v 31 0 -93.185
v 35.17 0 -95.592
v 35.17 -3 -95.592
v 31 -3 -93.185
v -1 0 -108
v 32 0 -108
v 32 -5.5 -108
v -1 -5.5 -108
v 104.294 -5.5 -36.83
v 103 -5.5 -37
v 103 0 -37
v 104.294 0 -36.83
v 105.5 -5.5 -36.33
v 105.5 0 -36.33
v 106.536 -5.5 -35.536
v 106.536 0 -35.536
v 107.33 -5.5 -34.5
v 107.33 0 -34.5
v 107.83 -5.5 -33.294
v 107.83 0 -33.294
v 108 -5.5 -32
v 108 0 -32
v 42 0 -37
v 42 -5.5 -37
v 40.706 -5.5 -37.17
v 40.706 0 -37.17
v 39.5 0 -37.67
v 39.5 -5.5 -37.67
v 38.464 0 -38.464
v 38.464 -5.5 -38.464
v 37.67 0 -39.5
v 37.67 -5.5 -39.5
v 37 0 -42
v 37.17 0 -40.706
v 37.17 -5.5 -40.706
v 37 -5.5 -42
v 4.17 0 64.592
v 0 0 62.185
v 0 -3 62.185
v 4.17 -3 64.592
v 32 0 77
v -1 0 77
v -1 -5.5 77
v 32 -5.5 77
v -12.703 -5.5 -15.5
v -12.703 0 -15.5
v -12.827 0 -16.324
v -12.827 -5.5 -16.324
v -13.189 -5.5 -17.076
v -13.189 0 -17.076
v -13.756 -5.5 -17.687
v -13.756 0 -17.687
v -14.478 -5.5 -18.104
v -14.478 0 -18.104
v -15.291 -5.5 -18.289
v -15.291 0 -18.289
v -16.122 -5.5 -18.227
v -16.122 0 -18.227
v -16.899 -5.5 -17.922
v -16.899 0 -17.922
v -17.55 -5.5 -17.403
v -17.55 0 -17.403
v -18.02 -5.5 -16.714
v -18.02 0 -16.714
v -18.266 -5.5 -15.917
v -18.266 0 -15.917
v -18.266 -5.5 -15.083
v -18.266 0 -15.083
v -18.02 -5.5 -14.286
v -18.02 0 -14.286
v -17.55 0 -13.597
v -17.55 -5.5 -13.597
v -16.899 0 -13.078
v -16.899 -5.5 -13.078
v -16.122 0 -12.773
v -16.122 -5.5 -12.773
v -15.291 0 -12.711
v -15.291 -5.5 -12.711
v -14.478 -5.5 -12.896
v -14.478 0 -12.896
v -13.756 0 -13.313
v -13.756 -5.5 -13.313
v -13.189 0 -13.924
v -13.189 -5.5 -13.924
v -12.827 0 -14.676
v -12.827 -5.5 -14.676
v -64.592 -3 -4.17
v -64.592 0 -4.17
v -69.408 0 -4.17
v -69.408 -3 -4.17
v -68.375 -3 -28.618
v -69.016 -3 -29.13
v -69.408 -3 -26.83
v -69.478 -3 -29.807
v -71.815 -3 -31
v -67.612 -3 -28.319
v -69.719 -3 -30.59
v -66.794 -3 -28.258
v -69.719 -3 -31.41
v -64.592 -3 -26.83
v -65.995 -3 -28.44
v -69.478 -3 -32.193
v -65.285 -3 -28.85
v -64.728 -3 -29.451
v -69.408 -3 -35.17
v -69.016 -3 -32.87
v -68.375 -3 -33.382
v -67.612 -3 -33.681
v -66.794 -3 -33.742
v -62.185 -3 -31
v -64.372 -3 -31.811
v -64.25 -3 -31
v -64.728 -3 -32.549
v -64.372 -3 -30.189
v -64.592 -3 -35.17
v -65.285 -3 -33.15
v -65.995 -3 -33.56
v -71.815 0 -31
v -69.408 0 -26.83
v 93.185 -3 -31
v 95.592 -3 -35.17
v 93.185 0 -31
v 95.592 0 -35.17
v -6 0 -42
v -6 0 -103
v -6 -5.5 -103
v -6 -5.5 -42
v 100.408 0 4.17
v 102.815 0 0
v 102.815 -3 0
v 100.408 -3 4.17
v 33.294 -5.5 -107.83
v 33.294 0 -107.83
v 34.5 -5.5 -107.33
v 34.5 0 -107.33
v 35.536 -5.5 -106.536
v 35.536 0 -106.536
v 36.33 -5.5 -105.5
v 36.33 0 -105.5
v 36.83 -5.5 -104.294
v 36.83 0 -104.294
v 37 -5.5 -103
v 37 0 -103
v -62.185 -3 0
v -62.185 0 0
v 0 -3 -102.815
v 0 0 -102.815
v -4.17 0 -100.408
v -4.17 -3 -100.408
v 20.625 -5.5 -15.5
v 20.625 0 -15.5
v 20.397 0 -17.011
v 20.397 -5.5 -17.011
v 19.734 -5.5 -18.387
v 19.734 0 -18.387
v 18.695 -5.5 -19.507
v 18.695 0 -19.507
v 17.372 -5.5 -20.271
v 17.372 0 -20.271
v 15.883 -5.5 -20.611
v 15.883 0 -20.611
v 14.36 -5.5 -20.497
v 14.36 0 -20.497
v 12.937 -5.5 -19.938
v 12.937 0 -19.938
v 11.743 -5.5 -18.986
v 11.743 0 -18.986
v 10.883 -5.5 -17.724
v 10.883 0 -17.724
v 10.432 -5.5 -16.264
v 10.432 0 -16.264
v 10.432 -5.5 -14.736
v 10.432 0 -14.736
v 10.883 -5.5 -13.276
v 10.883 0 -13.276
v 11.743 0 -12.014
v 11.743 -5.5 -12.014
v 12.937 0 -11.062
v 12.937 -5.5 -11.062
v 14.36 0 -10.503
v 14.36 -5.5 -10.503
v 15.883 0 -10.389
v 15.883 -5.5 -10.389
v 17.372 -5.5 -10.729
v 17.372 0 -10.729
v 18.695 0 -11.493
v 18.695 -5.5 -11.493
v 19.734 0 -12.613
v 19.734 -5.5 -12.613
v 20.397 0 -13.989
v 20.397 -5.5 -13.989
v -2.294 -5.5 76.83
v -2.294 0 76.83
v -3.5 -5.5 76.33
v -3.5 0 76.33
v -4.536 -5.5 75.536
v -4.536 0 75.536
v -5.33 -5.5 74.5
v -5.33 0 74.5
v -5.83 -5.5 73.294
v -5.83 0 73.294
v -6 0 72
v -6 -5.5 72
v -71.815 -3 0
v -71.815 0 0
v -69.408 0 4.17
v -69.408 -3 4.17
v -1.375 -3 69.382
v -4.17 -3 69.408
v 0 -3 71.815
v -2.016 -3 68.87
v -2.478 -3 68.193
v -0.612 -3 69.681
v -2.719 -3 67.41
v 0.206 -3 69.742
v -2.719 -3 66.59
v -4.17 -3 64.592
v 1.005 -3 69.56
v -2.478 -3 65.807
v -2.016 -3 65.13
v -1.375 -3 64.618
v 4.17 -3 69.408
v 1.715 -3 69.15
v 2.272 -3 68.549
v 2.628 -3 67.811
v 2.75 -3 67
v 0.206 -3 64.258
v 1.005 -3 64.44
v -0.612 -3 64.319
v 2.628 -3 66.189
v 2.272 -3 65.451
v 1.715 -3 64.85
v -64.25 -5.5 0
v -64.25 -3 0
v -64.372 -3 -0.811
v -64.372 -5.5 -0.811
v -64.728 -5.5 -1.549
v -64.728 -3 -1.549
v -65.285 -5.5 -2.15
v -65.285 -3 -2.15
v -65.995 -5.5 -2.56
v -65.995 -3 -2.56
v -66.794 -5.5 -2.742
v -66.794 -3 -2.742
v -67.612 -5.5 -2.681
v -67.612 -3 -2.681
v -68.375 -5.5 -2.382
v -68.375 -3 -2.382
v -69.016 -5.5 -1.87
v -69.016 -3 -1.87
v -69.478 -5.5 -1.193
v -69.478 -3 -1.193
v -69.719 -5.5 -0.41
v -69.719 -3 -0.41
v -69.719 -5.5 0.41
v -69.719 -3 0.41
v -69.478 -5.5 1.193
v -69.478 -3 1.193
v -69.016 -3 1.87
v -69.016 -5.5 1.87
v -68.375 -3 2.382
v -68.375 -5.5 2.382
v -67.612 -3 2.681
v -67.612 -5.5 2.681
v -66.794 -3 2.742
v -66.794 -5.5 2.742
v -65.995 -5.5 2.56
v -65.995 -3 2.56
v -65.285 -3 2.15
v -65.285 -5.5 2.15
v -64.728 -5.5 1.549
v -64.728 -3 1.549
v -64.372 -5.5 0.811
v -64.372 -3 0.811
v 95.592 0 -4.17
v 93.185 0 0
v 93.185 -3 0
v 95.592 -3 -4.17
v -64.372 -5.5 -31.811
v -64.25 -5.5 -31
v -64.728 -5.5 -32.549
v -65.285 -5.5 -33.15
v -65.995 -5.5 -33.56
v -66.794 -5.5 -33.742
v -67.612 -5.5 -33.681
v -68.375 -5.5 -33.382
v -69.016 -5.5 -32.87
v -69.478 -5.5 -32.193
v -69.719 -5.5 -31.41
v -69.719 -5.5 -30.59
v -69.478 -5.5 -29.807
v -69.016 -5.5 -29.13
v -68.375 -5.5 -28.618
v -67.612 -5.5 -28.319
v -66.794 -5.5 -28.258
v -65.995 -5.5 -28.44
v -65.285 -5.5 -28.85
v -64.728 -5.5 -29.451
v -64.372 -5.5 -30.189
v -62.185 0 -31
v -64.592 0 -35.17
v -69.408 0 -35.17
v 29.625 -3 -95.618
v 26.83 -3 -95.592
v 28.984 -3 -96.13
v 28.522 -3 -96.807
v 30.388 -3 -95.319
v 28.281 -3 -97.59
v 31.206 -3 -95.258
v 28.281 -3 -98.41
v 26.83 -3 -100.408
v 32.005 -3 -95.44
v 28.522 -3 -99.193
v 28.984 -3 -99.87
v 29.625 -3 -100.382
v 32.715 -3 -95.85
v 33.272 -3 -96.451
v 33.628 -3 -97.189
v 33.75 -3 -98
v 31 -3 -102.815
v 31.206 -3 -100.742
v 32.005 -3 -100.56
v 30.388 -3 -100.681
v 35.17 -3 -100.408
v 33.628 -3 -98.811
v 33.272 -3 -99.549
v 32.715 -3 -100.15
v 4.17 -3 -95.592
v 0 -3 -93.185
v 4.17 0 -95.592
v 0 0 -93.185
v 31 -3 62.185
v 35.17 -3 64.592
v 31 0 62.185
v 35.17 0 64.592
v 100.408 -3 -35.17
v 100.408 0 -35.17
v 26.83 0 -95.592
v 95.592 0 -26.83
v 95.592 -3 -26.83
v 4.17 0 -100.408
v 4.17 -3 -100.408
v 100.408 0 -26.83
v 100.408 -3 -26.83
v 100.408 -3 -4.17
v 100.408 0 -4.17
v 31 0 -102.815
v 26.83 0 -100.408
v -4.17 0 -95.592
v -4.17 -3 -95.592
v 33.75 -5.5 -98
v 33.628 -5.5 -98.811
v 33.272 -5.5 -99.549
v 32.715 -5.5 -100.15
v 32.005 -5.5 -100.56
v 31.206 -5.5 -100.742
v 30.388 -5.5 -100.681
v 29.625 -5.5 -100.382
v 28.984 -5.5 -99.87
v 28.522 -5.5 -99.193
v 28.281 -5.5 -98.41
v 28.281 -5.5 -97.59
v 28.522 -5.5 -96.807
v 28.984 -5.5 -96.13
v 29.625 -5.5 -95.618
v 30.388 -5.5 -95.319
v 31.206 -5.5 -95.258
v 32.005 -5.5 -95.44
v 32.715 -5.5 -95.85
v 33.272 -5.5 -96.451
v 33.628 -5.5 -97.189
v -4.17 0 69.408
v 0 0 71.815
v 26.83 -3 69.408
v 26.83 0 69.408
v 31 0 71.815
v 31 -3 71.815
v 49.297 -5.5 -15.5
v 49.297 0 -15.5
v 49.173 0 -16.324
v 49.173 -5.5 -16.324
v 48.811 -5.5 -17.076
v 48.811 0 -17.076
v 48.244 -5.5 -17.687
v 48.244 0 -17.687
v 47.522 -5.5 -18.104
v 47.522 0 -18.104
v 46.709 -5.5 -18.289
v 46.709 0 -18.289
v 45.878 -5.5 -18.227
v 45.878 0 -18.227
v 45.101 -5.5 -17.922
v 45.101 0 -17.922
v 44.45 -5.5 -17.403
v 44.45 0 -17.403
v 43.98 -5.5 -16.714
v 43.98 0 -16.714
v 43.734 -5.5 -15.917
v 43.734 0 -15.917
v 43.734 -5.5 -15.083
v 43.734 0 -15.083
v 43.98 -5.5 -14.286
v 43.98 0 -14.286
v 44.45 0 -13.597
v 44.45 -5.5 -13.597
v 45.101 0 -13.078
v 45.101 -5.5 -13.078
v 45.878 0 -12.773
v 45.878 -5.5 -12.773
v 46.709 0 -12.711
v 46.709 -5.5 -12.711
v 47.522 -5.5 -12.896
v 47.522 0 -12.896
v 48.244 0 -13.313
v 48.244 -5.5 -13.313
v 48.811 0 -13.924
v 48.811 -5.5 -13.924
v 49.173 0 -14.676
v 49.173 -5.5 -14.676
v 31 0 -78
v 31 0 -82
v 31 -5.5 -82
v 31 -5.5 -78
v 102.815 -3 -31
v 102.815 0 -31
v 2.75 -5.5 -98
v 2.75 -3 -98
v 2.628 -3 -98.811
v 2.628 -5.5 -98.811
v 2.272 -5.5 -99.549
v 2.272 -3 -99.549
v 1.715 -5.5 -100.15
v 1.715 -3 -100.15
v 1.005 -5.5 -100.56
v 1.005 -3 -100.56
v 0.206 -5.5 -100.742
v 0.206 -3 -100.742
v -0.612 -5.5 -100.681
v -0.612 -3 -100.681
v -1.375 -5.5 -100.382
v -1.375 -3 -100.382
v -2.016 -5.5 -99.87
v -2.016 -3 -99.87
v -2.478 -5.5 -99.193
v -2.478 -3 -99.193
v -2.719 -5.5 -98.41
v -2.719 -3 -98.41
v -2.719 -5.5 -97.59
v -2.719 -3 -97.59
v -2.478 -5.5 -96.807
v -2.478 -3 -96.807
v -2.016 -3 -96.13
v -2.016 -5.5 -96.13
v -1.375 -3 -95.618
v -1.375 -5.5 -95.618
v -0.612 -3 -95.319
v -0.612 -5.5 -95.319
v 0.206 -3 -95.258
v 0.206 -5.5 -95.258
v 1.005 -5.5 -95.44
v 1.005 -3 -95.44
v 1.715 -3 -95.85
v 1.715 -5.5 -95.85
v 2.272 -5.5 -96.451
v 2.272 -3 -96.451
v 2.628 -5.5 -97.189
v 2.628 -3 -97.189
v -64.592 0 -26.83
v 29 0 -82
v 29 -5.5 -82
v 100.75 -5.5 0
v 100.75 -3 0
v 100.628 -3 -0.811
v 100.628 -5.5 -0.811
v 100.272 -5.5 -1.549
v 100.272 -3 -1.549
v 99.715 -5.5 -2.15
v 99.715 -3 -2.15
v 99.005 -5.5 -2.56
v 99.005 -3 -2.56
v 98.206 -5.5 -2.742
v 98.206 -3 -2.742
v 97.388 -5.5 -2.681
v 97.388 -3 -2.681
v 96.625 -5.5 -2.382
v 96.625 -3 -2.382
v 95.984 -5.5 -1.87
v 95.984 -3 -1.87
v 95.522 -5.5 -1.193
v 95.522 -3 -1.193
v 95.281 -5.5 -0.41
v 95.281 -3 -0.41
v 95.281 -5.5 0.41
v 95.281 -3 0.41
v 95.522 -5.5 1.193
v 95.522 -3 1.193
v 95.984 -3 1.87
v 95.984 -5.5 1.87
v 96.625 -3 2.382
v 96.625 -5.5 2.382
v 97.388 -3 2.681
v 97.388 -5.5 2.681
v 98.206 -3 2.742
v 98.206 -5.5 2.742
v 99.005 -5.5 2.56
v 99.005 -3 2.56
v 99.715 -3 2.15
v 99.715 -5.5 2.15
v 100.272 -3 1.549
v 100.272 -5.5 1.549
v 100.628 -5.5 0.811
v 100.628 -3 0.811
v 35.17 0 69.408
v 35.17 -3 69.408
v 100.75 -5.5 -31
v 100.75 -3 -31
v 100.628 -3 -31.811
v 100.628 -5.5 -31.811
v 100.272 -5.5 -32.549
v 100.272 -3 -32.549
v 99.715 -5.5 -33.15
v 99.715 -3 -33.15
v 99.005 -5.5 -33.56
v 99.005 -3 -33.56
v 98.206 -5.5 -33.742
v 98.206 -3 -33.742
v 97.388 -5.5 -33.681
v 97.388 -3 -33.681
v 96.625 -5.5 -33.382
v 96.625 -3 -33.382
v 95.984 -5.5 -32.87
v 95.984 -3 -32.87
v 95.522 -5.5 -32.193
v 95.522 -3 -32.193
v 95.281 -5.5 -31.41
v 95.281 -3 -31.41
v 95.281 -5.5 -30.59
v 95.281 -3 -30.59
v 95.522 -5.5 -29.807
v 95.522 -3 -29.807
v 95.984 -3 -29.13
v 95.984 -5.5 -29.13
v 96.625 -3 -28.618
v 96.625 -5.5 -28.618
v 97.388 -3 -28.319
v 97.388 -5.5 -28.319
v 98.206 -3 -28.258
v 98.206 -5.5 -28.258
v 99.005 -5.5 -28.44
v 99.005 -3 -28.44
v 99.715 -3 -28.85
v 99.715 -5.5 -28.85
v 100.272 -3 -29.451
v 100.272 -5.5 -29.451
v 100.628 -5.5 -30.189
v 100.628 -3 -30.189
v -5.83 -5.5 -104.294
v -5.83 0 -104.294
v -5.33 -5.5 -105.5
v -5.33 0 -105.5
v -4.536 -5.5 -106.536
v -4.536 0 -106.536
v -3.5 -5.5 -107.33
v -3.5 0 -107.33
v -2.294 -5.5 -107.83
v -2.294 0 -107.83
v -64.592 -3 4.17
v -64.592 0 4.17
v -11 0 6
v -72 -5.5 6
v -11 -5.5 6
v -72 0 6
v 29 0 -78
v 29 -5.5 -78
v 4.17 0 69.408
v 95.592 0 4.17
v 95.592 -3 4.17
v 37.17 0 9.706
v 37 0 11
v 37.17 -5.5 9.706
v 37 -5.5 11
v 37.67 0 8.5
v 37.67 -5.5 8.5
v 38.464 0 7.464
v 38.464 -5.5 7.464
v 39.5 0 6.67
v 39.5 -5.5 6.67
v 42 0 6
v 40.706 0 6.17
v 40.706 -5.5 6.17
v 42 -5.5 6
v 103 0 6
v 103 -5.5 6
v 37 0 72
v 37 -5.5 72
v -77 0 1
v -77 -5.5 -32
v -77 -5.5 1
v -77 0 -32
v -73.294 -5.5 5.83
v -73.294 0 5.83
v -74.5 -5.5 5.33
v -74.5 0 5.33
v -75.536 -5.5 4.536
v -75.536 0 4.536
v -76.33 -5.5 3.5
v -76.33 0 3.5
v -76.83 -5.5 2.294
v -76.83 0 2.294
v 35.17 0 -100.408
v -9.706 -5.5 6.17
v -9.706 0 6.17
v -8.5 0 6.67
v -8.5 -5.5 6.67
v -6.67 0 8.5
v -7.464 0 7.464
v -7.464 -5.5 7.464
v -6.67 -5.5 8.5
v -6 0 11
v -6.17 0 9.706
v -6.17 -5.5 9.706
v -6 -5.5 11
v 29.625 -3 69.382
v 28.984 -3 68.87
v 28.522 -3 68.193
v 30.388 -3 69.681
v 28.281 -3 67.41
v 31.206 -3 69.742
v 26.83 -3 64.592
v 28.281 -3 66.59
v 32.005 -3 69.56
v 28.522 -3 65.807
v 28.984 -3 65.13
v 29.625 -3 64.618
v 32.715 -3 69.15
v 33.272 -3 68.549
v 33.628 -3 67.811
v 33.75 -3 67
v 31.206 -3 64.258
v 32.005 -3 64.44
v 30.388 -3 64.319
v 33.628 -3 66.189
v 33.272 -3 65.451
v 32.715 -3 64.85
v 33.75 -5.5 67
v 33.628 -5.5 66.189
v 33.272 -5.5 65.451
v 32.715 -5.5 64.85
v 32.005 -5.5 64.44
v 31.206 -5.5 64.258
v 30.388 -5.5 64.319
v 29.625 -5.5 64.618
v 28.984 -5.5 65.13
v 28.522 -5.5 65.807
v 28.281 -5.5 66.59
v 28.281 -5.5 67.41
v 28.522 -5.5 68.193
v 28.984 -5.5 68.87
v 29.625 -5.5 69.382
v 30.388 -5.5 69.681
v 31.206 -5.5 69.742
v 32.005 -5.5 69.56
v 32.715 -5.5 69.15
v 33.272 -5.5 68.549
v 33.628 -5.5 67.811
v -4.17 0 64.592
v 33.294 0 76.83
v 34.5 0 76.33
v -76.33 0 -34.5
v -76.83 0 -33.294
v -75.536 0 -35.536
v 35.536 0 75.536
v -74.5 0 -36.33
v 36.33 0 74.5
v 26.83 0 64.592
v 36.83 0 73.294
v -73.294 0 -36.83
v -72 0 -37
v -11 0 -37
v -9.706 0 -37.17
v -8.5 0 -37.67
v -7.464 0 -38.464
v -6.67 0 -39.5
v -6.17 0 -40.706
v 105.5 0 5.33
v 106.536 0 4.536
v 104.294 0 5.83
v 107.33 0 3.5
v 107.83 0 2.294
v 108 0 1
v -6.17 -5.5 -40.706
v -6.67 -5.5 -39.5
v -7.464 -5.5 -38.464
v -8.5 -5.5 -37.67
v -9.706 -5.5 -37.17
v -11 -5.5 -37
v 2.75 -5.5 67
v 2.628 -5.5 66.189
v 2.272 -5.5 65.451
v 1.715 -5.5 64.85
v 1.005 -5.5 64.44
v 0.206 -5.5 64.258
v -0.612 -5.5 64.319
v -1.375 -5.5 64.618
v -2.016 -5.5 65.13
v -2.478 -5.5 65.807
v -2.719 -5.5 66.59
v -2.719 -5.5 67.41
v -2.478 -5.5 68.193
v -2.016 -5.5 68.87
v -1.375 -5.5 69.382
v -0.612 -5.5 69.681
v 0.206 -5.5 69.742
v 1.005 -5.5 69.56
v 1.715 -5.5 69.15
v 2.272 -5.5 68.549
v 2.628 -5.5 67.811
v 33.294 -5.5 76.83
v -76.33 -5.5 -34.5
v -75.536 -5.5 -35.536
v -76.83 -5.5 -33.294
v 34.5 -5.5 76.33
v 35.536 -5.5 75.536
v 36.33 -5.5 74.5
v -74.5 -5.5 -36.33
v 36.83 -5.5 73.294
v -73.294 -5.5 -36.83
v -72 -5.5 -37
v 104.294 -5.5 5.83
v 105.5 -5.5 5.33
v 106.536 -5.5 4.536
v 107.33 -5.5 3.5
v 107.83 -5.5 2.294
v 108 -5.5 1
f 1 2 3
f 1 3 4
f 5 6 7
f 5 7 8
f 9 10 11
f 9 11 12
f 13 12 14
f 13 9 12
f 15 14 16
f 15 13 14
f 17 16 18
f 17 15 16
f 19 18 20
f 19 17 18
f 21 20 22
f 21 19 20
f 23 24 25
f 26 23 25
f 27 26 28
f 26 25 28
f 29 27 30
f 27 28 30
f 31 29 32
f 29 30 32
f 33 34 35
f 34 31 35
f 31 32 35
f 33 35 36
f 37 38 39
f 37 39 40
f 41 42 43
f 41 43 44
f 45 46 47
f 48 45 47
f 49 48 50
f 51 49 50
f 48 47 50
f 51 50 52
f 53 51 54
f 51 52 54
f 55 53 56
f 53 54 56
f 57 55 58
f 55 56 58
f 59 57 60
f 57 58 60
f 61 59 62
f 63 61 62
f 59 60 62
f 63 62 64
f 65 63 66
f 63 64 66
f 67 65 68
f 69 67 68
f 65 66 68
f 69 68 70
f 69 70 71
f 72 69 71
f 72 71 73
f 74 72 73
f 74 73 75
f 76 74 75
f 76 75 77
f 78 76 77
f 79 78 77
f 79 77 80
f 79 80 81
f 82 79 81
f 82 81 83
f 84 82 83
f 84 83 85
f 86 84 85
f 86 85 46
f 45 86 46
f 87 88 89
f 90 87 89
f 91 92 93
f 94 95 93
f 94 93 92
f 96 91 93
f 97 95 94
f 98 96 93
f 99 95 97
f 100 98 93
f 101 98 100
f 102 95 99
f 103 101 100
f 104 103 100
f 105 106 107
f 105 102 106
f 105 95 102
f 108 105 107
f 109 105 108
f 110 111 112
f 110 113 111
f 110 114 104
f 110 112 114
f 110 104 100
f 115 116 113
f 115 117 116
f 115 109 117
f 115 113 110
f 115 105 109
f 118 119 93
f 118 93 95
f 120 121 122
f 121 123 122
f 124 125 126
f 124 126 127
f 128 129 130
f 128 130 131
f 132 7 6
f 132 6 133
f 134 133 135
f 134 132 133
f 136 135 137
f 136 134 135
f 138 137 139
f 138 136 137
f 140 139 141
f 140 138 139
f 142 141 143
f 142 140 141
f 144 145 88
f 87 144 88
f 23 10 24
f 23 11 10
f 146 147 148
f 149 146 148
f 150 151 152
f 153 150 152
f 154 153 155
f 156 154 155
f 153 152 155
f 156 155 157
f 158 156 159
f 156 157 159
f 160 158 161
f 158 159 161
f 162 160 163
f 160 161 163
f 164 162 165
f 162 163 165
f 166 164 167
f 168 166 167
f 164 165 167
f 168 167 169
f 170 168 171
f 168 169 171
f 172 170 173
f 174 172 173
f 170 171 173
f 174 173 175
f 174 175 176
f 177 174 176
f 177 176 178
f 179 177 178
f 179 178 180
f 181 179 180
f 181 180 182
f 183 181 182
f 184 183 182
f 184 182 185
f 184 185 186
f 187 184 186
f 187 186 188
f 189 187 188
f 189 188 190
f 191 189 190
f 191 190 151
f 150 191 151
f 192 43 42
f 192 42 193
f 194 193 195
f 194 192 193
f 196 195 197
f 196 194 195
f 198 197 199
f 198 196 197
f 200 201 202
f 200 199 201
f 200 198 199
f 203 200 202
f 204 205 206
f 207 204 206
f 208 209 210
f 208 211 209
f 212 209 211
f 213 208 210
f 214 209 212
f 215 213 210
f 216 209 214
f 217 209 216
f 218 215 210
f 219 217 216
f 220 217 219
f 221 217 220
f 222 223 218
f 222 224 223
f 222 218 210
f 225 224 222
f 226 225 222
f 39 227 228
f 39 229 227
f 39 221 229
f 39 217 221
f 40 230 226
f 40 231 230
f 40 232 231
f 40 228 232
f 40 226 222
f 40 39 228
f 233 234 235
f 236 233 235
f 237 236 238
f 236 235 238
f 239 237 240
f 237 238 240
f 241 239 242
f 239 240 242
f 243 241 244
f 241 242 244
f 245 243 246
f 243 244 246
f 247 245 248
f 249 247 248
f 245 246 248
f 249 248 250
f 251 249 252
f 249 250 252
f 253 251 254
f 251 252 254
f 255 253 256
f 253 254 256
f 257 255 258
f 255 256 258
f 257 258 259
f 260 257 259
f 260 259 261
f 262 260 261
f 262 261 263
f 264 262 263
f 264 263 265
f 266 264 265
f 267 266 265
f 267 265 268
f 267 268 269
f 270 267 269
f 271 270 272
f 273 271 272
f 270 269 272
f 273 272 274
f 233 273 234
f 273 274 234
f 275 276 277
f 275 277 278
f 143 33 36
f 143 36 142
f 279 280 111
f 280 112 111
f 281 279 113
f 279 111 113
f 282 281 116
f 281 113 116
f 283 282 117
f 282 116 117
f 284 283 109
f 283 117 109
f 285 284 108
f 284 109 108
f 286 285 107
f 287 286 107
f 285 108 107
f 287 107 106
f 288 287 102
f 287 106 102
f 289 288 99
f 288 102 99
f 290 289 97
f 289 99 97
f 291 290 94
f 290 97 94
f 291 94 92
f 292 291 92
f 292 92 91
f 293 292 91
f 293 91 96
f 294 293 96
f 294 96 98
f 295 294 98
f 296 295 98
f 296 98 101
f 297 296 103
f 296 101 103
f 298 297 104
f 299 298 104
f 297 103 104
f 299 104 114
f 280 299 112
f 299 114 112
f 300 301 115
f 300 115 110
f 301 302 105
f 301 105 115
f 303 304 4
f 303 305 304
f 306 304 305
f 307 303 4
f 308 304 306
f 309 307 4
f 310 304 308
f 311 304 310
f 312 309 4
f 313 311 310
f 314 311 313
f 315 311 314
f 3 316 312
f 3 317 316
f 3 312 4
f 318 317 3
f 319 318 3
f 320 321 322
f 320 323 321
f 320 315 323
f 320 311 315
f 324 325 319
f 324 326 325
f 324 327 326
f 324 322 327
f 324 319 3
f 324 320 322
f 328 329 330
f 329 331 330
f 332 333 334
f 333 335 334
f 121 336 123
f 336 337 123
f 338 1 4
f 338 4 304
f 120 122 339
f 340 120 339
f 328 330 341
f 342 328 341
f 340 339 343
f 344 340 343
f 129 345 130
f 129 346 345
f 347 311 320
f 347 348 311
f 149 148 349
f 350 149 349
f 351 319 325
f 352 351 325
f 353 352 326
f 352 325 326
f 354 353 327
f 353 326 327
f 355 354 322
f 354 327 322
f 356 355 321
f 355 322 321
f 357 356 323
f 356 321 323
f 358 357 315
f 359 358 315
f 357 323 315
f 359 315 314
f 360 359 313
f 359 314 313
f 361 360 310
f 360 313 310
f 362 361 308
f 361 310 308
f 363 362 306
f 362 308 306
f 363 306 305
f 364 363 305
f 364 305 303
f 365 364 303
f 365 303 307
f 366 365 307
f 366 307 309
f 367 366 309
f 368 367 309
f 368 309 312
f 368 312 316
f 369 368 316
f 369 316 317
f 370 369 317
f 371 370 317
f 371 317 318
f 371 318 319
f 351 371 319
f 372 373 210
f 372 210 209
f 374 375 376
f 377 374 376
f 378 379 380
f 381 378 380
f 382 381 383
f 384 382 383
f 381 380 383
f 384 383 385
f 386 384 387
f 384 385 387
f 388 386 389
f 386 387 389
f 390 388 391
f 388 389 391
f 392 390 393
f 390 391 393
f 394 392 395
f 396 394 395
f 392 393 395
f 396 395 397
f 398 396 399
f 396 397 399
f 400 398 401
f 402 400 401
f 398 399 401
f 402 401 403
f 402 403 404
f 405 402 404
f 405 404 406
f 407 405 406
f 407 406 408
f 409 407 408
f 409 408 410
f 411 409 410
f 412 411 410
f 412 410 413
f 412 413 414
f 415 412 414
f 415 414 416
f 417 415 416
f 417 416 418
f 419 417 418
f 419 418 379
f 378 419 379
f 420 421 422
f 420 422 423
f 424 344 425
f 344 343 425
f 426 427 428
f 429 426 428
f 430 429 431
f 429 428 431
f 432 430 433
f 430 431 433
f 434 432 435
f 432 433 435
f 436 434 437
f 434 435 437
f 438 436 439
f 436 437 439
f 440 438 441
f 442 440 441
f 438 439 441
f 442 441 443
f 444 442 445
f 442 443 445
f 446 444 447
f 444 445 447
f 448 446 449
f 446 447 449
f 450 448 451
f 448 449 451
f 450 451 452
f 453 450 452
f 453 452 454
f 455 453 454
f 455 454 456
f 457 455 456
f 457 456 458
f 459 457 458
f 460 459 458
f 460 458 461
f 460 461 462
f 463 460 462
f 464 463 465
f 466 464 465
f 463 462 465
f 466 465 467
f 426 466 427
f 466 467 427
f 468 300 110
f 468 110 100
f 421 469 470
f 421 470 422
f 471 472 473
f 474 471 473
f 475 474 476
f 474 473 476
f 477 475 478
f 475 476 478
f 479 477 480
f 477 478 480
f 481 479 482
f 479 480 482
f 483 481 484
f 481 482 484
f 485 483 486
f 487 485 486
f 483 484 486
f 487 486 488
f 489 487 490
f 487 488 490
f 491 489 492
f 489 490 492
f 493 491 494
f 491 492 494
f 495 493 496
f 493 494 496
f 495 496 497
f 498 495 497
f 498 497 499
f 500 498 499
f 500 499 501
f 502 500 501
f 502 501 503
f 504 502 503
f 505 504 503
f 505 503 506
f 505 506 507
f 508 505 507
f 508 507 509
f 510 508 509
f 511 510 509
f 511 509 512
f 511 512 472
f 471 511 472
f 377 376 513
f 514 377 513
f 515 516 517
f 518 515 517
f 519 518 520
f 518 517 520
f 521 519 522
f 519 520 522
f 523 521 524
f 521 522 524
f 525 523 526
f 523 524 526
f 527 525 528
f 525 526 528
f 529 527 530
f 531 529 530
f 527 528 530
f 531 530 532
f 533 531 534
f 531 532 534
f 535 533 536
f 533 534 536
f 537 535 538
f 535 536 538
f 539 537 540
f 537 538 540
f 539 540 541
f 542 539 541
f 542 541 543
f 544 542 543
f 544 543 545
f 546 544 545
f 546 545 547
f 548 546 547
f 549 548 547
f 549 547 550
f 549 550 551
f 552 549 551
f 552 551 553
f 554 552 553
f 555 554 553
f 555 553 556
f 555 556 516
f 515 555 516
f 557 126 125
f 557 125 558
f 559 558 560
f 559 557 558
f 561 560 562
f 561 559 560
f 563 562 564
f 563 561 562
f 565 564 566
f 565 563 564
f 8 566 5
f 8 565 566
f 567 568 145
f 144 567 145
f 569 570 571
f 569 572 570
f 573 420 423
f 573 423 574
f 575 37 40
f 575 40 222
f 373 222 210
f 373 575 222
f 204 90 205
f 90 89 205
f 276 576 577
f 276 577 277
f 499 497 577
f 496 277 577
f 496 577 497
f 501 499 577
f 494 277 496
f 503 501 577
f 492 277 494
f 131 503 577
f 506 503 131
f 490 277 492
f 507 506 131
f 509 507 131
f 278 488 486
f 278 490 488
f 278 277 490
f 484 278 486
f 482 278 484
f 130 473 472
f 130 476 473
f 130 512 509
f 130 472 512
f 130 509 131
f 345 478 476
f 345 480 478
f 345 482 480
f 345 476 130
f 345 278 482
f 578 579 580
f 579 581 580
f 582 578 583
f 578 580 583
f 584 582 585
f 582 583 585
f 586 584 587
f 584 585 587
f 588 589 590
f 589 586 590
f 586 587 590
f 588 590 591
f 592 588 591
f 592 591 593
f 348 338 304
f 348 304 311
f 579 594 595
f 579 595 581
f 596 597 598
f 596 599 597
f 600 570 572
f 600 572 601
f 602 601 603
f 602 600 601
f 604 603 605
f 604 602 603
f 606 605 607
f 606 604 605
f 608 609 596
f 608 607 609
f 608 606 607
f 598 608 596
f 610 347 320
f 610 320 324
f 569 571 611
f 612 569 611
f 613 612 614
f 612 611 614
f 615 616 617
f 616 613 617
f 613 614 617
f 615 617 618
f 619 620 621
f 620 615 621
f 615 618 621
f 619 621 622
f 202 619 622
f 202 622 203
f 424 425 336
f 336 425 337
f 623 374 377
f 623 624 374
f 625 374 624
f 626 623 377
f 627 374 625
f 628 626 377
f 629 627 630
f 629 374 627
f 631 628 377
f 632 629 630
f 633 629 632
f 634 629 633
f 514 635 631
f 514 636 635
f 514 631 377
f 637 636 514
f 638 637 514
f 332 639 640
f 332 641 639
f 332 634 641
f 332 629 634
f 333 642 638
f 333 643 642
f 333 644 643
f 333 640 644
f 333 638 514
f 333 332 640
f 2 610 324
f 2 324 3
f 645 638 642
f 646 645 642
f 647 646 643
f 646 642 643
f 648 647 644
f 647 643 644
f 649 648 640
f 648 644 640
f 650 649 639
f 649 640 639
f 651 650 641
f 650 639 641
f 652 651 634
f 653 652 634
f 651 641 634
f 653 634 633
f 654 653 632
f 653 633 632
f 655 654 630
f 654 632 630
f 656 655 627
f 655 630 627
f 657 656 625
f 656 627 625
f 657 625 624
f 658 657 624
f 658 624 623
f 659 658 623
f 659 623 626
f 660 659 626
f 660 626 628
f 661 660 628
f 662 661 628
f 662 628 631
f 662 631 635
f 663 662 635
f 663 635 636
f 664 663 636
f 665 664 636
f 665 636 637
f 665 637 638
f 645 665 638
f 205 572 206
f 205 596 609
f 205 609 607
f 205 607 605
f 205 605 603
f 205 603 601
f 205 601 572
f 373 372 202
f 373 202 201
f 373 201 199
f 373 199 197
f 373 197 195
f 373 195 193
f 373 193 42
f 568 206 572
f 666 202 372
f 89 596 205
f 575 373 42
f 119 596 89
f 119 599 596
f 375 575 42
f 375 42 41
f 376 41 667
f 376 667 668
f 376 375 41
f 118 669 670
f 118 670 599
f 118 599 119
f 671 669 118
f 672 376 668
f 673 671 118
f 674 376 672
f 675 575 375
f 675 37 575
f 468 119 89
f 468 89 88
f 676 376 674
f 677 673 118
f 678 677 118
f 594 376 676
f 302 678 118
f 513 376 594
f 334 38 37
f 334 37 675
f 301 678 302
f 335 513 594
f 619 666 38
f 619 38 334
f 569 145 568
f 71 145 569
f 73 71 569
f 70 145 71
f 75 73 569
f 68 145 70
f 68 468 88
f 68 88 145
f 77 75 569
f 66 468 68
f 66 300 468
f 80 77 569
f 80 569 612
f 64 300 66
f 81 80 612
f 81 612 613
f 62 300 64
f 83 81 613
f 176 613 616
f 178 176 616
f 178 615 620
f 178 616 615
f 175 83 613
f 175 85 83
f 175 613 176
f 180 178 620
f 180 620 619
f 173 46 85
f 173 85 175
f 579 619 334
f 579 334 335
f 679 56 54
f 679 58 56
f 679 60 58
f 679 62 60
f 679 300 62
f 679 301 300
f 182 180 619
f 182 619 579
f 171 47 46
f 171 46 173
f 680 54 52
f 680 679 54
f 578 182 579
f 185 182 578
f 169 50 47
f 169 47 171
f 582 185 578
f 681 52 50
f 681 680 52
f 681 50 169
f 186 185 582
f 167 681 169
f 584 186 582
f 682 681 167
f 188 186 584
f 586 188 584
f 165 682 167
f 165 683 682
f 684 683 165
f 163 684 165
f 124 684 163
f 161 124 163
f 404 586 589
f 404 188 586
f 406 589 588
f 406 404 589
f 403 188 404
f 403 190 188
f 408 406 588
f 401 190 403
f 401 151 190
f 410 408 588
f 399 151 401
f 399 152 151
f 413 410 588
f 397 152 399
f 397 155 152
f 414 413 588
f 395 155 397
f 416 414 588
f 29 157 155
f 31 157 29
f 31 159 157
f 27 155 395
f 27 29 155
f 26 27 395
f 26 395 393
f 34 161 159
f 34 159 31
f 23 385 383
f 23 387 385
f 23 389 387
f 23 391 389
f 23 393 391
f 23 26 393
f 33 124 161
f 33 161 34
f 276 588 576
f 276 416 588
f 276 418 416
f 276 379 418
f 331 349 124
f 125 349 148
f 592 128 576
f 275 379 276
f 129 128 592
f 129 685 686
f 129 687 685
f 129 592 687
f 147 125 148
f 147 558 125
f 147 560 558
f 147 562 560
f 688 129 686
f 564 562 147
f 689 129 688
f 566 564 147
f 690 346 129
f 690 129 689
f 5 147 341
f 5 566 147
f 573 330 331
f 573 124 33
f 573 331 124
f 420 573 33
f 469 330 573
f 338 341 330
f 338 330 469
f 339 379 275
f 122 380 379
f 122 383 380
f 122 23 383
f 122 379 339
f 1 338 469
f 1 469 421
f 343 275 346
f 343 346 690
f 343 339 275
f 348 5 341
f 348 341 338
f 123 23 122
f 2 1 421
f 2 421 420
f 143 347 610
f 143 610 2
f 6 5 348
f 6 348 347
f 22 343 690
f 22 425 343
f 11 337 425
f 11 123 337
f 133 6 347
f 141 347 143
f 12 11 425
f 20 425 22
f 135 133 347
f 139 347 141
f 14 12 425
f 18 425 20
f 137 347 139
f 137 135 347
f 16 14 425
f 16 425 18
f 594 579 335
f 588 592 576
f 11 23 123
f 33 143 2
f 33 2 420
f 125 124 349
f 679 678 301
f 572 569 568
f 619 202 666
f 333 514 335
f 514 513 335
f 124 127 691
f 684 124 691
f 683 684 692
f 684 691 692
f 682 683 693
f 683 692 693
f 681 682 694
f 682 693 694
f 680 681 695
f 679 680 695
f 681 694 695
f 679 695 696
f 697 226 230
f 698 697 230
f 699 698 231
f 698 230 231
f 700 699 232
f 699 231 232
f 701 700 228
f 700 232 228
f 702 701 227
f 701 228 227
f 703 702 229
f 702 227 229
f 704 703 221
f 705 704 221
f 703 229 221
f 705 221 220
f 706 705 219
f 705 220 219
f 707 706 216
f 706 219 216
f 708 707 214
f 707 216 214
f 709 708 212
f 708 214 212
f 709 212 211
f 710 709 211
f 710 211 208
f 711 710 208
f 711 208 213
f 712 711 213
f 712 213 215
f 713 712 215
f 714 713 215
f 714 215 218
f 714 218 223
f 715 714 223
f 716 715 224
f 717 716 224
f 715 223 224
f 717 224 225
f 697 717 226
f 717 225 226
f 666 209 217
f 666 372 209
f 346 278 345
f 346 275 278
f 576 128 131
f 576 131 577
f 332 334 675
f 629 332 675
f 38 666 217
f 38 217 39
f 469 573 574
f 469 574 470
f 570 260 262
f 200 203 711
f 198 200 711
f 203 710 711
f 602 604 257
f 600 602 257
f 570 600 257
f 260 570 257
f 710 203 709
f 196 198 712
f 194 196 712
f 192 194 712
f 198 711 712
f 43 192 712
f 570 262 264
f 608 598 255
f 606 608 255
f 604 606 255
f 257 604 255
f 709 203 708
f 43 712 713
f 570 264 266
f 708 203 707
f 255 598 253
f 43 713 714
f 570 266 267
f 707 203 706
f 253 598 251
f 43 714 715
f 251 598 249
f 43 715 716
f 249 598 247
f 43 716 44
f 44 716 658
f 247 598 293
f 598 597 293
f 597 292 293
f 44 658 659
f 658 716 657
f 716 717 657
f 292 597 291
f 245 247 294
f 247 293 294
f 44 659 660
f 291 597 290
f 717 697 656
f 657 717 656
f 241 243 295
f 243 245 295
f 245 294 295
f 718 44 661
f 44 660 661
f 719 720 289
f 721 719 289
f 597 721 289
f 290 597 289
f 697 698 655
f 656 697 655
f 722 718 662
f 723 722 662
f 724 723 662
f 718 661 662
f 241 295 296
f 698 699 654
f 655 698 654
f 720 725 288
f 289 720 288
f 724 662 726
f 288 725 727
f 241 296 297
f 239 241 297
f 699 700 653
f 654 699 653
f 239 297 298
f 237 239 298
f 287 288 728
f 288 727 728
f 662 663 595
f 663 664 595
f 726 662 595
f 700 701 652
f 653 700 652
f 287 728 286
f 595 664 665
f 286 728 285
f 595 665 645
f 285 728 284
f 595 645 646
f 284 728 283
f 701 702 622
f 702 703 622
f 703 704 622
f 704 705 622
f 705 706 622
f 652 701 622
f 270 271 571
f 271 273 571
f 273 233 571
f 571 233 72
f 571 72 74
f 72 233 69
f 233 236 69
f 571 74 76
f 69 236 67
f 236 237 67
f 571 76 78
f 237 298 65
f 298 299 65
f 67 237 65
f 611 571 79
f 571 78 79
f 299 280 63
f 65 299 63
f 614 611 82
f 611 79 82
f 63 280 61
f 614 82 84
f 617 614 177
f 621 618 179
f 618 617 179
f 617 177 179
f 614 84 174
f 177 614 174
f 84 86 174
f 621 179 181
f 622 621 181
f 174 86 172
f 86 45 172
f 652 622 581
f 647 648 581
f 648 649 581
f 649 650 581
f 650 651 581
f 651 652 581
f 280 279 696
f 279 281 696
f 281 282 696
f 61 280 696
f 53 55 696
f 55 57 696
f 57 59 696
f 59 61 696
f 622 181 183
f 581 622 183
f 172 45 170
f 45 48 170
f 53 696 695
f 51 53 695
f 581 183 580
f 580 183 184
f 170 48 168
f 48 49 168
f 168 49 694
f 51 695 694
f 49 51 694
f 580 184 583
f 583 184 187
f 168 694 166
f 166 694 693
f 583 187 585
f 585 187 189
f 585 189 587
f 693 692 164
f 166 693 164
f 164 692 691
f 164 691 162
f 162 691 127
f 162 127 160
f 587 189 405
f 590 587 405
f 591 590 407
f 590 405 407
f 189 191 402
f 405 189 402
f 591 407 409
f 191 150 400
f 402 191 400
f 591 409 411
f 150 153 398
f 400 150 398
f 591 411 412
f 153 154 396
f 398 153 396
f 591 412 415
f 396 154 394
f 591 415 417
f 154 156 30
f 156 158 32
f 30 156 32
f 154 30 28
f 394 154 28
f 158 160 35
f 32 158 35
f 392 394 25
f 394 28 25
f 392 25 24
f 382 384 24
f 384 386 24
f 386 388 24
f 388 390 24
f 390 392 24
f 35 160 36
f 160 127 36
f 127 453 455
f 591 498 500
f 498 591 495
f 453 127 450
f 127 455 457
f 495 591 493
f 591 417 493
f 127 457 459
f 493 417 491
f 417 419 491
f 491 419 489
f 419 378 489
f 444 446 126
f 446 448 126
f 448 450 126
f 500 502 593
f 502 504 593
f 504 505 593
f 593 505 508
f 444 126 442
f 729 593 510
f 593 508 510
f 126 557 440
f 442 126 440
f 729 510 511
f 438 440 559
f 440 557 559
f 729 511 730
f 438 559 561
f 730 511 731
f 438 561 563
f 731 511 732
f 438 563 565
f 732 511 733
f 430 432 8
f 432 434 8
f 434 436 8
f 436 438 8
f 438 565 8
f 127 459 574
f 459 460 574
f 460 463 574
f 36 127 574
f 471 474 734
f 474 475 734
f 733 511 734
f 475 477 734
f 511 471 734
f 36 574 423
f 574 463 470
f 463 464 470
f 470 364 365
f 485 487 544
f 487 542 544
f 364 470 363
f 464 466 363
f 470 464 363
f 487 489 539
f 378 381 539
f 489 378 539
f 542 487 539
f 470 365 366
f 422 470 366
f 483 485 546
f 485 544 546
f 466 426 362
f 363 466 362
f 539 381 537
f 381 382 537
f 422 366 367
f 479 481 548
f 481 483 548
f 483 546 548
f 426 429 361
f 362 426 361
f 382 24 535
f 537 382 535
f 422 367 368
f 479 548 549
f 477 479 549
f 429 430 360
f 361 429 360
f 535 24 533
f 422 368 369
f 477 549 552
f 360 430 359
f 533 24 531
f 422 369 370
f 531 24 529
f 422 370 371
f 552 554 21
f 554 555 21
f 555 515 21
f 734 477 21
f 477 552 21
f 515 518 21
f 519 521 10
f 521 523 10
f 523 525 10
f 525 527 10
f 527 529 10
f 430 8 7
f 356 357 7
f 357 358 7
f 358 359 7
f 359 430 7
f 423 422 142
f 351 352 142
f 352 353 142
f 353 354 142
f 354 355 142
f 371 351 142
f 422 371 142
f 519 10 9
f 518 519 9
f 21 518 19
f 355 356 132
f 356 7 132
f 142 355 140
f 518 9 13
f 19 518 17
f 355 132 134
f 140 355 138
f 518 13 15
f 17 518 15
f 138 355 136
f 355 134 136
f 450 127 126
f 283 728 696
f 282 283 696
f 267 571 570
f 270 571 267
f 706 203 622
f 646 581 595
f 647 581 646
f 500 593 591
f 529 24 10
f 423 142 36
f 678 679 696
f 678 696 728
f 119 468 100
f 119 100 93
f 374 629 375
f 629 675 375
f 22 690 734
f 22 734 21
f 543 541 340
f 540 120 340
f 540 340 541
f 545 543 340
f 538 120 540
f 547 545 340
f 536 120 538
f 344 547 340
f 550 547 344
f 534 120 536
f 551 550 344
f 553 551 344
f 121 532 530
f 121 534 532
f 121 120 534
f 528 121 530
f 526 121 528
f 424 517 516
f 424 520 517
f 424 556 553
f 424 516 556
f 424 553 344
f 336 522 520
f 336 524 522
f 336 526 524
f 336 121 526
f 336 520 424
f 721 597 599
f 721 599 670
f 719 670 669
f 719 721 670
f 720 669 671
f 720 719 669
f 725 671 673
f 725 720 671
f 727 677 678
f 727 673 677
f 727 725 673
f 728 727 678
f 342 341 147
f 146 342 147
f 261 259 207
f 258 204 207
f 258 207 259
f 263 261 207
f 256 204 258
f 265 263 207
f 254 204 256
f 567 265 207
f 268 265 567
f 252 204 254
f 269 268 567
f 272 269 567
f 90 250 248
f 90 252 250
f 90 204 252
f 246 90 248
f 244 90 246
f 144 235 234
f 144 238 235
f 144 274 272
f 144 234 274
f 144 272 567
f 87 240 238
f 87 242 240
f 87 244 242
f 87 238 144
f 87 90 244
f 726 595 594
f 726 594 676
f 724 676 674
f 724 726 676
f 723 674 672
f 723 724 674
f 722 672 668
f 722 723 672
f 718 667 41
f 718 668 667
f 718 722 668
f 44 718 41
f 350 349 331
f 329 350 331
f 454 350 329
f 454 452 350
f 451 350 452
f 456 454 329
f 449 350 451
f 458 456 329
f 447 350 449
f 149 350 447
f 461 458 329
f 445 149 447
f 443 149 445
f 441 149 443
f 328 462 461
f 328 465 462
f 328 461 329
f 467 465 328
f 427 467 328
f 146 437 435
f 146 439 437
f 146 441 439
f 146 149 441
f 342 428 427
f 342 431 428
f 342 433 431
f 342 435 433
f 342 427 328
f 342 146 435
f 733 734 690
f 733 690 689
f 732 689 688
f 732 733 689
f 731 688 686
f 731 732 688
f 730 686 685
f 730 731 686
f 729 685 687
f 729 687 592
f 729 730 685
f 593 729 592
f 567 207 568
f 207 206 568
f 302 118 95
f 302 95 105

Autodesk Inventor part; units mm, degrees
ref_plane "YZ Plane" through (0, 0, 0) normal (1, 0, 0) x (0, 1, 0)
ref_plane "XZ Plane" through (0, 0, 0) normal (0, 1, 0) x (-1, 0, 0)
ref_plane "XY Plane" through (0, 0, 0) normal (0, 0, 1) x (1, 0, 0)
sketch "Sketch1" plane through (0, 0, 0) normal (0, 1, 0) x (1, 0, 0)
  circle A0 centre (0, 0) radius 2.25
  circle A1 centre (31, 0) radius 2.25
  circle A2 centre (0, 31) radius 2.25
  circle A3 centre (31, 31) radius 2.25
  circle A4 centre (15.5, 15.5) radius 5.125
  line L0 (-6, 37) -> (37, 37)
  line L1 (37, 37) -> (37, -6)
  line L2 (37, -6) -> (-6, -6)
  line L3 (-6, -6) -> (-6, 37)
  line L4 (-6, 37) -> (37, -6) construction
  line L5 (37, 37) -> (-6, -6) construction
  line L6 (-6, -6) -> (37, -6)
  circle A5 centre (0, 98) radius 2.75
  circle A6 centre (31, 98) radius 2.75
  line L7 (-6, 37) -> (37, 37)
  line L8 (37, 37) -> (37, 108)
  line L9 (37, 108) -> (-6, 108)
  line L10 (-6, 108) -> (-6, 37)
  line L11 (15.5, 15.5) -> (22.827, 15.5)
  line L12 (13, 103) -> (18, 103)
  line L13 (15.5, 103) -> (15.5, 96.4439)
  arc A7 (0, 95.25) -> (0, 100.75) centre (0, 98) ccw
  circle A8 centre (-15.5, 15.5) radius 2.7971
  circle A9 centre (46.5, 15.5) radius 2.7971
  line L14 (0, 93.4736) -> (-3.92, 95.7368)
  line L15 (-3.92, 95.7368) -> (-3.92, 100.2632)
  line L16 (-3.92, 100.2632) -> (0, 102.5264)
  line L17 (0, 102.5264) -> (3.92, 100.2632)
  line L18 (3.92, 100.2632) -> (3.92, 95.7368)
  line L19 (3.92, 95.7368) -> (0, 93.4736)
  line L20 (4.17, 100.4076) -> (0, 102.8151)
  line L21 (0, 102.8151) -> (-4.17, 100.4076)
  line L22 (-4.17, 100.4076) -> (-4.17, 95.5924)
  line L23 (-4.17, 95.5924) -> (0, 93.1849)
  line L24 (0, 93.1849) -> (4.17, 95.5924)
  line L25 (4.17, 95.5924) -> (4.17, 100.4076)
  circle A10 centre (31, 98) radius 2.75
  circle A11 centre (31, 98) radius 2.75
  arc A12 (31, 100.75) -> (31, 95.25) centre (31, 98) ccw
  line L26 (31, 93.4736) -> (34.92, 95.7368)
  line L27 (34.92, 95.7368) -> (34.92, 100.2632)
  line L28 (34.92, 100.2632) -> (31, 102.5264)
  line L29 (31, 102.5264) -> (27.08, 100.2632)
  line L30 (27.08, 100.2632) -> (27.08, 95.7368)
  line L31 (27.08, 95.7368) -> (31, 93.4736)
  line L32 (26.83, 100.4076) -> (31, 102.8151)
  line L33 (31, 102.8151) -> (35.17, 100.4076)
  line L34 (35.17, 100.4076) -> (35.17, 95.5924)
  line L35 (35.17, 95.5924) -> (31, 93.1849)
  line L36 (31, 93.1849) -> (26.83, 95.5924)
  line L37 (26.83, 95.5924) -> (26.83, 100.4076)
  line L38 (-64.7368, -3.92) -> (-69.2632, -3.92)
  line L39 (-69.4076, -4.17) -> (-64.5924, -4.17)
  line L40 (-69.2632, -3.92) -> (-71.5264, 0)
  line L41 (-71.8151, 0) -> (-69.4076, -4.17)
  circle A13 centre (-67, 31) radius 2.75
  line L42 (-72, 13) -> (-72, 18)
  line L43 (-69.2632, 27.08) -> (-64.7368, 27.08)
  line L44 (-64.7368, 34.92) -> (-69.2632, 34.92)
  line L45 (-64.5924, 26.83) -> (-69.4076, 26.83)
  circle A14 centre (-67, 31) radius 2.75
  circle A15 centre (-67, 31) radius 2.75
  arc A16 (-69.75, 31) -> (-64.25, 31) centre (-67, 31) ccw
  line L46 (-72, 15.5) -> (-65.4439, 15.5)
  line L47 (-69.2632, 34.92) -> (-71.5264, 31)
  line L48 (-71.8151, 31) -> (-69.4076, 35.17)
  line L49 (-69.4076, 35.17) -> (-64.5924, 35.17)
  line L50 (-71.5264, 31) -> (-69.2632, 27.08)
  line L51 (-69.4076, 26.83) -> (-71.8151, 31)
  line L52 (-62.4736, 0) -> (-64.7368, -3.92)
  line L53 (-64.5924, -4.17) -> (-62.1849, 0)
  circle A17 centre (-67, 0) radius 2.75
  arc A18 (-64.25, 0) -> (-69.75, 0) centre (-67, 0) ccw
  line L54 (-71.5264, 0) -> (-69.2632, 3.92)
  line L55 (-69.4076, 4.17) -> (-71.8151, 0)
  line L56 (-69.2632, 3.92) -> (-64.7368, 3.92)
  line L57 (-64.5924, 4.17) -> (-69.4076, 4.17)
  line L58 (-62.1849, 0) -> (-64.5924, 4.17)
  line L59 (-64.7368, 3.92) -> (-62.4736, 0)
  line L60 (-62.1849, 31) -> (-64.5924, 26.83)
  line L61 (-64.7368, 27.08) -> (-62.4736, 31)
  line L62 (-77, -6) -> (-6, -6)
  line L63 (-62.4736, 31) -> (-64.7368, 34.92)
  line L64 (-64.5924, 35.17) -> (-62.1849, 31)
  line L65 (-77, 37) -> (-77, -6)
  line L66 (-6, 37) -> (-77, 37)
  line L67 (34.92, -64.7368) -> (34.92, -69.2632)
  line L68 (35.17, -69.4076) -> (35.17, -64.5924)
  line L69 (34.92, -69.2632) -> (31, -71.5264)
  line L70 (31, -71.8151) -> (35.17, -69.4076)
  circle A19 centre (0, -67) radius 2.75
  line L71 (18, -72) -> (13, -72)
  line L72 (3.92, -69.2632) -> (3.92, -64.7368)
  line L73 (-3.92, -64.7368) -> (-3.92, -69.2632)
  line L74 (4.17, -64.5924) -> (4.17, -69.4076)
  circle A20 centre (0, -67) radius 2.75
  circle A21 centre (0, -67) radius 2.75
  arc A22 (0, -69.75) -> (0, -64.25) centre (0, -67) ccw
  line L75 (15.5, -72) -> (15.5, -65.4439)
  line L76 (-3.92, -69.2632) -> (0, -71.5264)
  line L77 (0, -71.8151) -> (-4.17, -69.4076)
  line L78 (-4.17, -69.4076) -> (-4.17, -64.5924)
  line L79 (0, -71.5264) -> (3.92, -69.2632)
  line L80 (4.17, -69.4076) -> (0, -71.8151)
  line L81 (31, -62.4736) -> (34.92, -64.7368)
  line L82 (35.17, -64.5924) -> (31, -62.1849)
  circle A23 centre (31, -67) radius 2.75
  arc A24 (31, -64.25) -> (31, -69.75) centre (31, -67) ccw
  line L83 (31, -71.5264) -> (27.08, -69.2632)
  line L84 (26.83, -69.4076) -> (31, -71.8151)
  line L85 (27.08, -69.2632) -> (27.08, -64.7368)
  line L86 (26.83, -64.5924) -> (26.83, -69.4076)
  line L87 (31, -62.1849) -> (26.83, -64.5924)
  line L88 (27.08, -64.7368) -> (31, -62.4736)
  line L89 (0, -62.1849) -> (4.17, -64.5924)
  line L90 (3.92, -64.7368) -> (0, -62.4736)
  line L91 (37, -77) -> (37, -6)
  line L92 (0, -62.4736) -> (-3.92, -64.7368)
  line L93 (-4.17, -64.5924) -> (0, -62.1849)
  line L94 (-6, -77) -> (37, -77)
  line L95 (-6, -6) -> (-6, -77)
  line L96 (95.7368, 34.92) -> (100.2632, 34.92)
  line L97 (100.4076, 35.17) -> (95.5924, 35.17)
  line L98 (100.2632, 34.92) -> (102.5264, 31)
  line L99 (102.8151, 31) -> (100.4076, 35.17)
  circle A25 centre (98, 0) radius 2.75
  line L100 (103, 18) -> (103, 13)
  line L101 (100.2632, 3.92) -> (95.7368, 3.92)
  line L102 (95.7368, -3.92) -> (100.2632, -3.92)
  line L103 (95.5924, 4.17) -> (100.4076, 4.17)
  circle A26 centre (98, 0) radius 2.75
  circle A27 centre (98, 0) radius 2.75
  arc A28 (100.75, 0) -> (95.25, 0) centre (98, 0) ccw
  line L104 (103, 15.5) -> (96.4439, 15.5)
  line L105 (100.2632, -3.92) -> (102.5264, 0)
  line L106 (102.8151, 0) -> (100.4076, -4.17)
  line L107 (100.4076, -4.17) -> (95.5924, -4.17)
  line L108 (102.5264, 0) -> (100.2632, 3.92)
  line L109 (100.4076, 4.17) -> (102.8151, 0)
  line L110 (93.4736, 31) -> (95.7368, 34.92)
  line L111 (95.5924, 35.17) -> (93.1849, 31)
  circle A29 centre (98, 31) radius 2.75
  arc A30 (95.25, 31) -> (100.75, 31) centre (98, 31) ccw
  line L112 (102.5264, 31) -> (100.2632, 27.08)
  line L113 (100.4076, 26.83) -> (102.8151, 31)
  line L114 (100.2632, 27.08) -> (95.7368, 27.08)
  line L115 (95.5924, 26.83) -> (100.4076, 26.83)
  line L116 (93.1849, 31) -> (95.5924, 26.83)
  line L117 (95.7368, 27.08) -> (93.4736, 31)
  line L118 (93.1849, 0) -> (95.5924, 4.17)
  line L119 (95.7368, 3.92) -> (93.4736, 0)
  line L120 (108, 37) -> (37, 37)
  line L121 (93.4736, 0) -> (95.7368, -3.92)
  line L122 (95.5924, -4.17) -> (93.1849, 0)
  line L123 (108, -6) -> (108, 37)
  line L124 (37, -6) -> (108, -6)
  point P0 (37, 37)
  point P1 (37, 37)
  point P2 (-3.5, 98)
  point P3 (34.5, 98)
  point P4 (-67, -3.5)
  point P5 (-67, 34.5)
  point P6 (34.5, -67)
  point P7 (-3.5, -67)
  point P8 (98, 34.5)
  point P9 (98, -3.5)
  point P10 (-6, -6)
  point P11 (-6, -6)
  point P12 (-6, -6)
  point P13 (-6, -6)
  point P14 (-6, -6)
  point P15 (37, 37)
  dimension "d3" = 4.5
  dimension "d5" = 31
  dimension "d6" = 10.25
  dimension "d8" = 43
  dimension "d23" = 5.5
  dimension "d24" = 31
  dimension "d25" = 31
  dimension "d27" = 6
  dimension "d28" = 10
  dimension "d71" = 62
  dimension "d72" = 31
  dimension "d73" = 7.84
  dimension "d74" = 0.25
  dimension "d81" = 82.5
  dimension "d84" = 360
extrude "Extrusion4" add sketch "Sketch1" against normal blind 5.5 contours A0 | A1 | A2 | A3 | L10 L9 L8 L0 | L0 L1 L2 L3 | L3 L62 L65 L66 | L120 L123 L124 L1 | L2 L91 L94 L95 | L14 L15 L16 L17 L18 L19 | L25 L24 L23 L22 L21 L20 | L31 L30 L29 L28 L27 L26 | L32 L33 L34 L35 L36 L37 | L38 L40 L54 L56 L59 L52 | L41 L55 L57 L58 L53 L39 | L50 L47 L44 L63 L61 L43 | L45 L51 L48 L49 L64 L60 | L67 L69 L83 L85 L88 L81 | L70 L84 L86 L87 L82 L68 | L79 L76 L73 L92 L90 L72 | L74 L80 L77 L78 L93 L89 | L96 L98 L112 L114 L117 L110 | L99 L113 L115 L116 L111 L97 | L108 L105 L102 L121 L119 L101 | L103 L109 L106 L107 L122 L118
fillet "Fillet4" radius 5 4 edges at (-6, -2.75, -37) (-6, -2.75, 6) (37, -2.75, 6) (37, -2.75, -37)
fillet "Fillet5" radius 5 8 edges at (37, -2.75, -108) (-6, -2.75, -108) (108, -2.75, 6) (108, -2.75, -37) (37, -2.75, 77) (-6, -2.75, 77) (-77, -2.75, 6) (-77, -2.75, -37)
extrude "Extrusion7" cut sketch "Sketch1" against normal blind 3 contours A5 | A6 | L14 L15 L16 L17 L18 L19 | L25 L24 L23 L22 L21 L20 | L31 L30 L29 L28 L27 L26 | L32 L33 L34 L35 L36 L37 | L38 L40 L54 L56 L59 L52 | L41 L55 L57 L58 L53 L39 | A13 | L50 L47 L44 L63 L61 L43 | L45 L51 L48 L49 L64 L60 | A17 | L67 L69 L83 L85 L88 L81 | L70 L84 L86 L87 L82 L68 | A19 | L79 L76 L73 L92 L90 L72 | L74 L80 L77 L78 L93 L89 | A23 | L96 L98 L112 L114 L117 L110 | L99 L113 L115 L116 L111 L97 | A25 | L108 L105 L102 L121 L119 L101 | L103 L109 L106 L107 L122 L118 | A29
sketch "Sketch6" plane through (0, 0, 0) normal (0, 1, 0) x (1, 0, 0)
  line L0 (31, 78) -> (29, 78)
  line L1 (29, 78) -> (29, 82)
  line L2 (29, 82) -> (31, 82)
  line L3 (31, 82) -> (31, 78)
  line L4 (37, 42) -> (37, 103) projected
  line L5 (32, 108) -> (-1, 108) projected
  circle A0 centre (31, 98) radius 2.75 projected
  point P0 (0, 0)
  dimension "d86" = 2
  dimension "d87" = 4
  dimension "d88" = 6
  dimension "d92" = 16
extrude "Extrusion8" cut sketch "Sketch6" against normal through all contours L0 L1 L2 L3
properties part number "motor_holder"
